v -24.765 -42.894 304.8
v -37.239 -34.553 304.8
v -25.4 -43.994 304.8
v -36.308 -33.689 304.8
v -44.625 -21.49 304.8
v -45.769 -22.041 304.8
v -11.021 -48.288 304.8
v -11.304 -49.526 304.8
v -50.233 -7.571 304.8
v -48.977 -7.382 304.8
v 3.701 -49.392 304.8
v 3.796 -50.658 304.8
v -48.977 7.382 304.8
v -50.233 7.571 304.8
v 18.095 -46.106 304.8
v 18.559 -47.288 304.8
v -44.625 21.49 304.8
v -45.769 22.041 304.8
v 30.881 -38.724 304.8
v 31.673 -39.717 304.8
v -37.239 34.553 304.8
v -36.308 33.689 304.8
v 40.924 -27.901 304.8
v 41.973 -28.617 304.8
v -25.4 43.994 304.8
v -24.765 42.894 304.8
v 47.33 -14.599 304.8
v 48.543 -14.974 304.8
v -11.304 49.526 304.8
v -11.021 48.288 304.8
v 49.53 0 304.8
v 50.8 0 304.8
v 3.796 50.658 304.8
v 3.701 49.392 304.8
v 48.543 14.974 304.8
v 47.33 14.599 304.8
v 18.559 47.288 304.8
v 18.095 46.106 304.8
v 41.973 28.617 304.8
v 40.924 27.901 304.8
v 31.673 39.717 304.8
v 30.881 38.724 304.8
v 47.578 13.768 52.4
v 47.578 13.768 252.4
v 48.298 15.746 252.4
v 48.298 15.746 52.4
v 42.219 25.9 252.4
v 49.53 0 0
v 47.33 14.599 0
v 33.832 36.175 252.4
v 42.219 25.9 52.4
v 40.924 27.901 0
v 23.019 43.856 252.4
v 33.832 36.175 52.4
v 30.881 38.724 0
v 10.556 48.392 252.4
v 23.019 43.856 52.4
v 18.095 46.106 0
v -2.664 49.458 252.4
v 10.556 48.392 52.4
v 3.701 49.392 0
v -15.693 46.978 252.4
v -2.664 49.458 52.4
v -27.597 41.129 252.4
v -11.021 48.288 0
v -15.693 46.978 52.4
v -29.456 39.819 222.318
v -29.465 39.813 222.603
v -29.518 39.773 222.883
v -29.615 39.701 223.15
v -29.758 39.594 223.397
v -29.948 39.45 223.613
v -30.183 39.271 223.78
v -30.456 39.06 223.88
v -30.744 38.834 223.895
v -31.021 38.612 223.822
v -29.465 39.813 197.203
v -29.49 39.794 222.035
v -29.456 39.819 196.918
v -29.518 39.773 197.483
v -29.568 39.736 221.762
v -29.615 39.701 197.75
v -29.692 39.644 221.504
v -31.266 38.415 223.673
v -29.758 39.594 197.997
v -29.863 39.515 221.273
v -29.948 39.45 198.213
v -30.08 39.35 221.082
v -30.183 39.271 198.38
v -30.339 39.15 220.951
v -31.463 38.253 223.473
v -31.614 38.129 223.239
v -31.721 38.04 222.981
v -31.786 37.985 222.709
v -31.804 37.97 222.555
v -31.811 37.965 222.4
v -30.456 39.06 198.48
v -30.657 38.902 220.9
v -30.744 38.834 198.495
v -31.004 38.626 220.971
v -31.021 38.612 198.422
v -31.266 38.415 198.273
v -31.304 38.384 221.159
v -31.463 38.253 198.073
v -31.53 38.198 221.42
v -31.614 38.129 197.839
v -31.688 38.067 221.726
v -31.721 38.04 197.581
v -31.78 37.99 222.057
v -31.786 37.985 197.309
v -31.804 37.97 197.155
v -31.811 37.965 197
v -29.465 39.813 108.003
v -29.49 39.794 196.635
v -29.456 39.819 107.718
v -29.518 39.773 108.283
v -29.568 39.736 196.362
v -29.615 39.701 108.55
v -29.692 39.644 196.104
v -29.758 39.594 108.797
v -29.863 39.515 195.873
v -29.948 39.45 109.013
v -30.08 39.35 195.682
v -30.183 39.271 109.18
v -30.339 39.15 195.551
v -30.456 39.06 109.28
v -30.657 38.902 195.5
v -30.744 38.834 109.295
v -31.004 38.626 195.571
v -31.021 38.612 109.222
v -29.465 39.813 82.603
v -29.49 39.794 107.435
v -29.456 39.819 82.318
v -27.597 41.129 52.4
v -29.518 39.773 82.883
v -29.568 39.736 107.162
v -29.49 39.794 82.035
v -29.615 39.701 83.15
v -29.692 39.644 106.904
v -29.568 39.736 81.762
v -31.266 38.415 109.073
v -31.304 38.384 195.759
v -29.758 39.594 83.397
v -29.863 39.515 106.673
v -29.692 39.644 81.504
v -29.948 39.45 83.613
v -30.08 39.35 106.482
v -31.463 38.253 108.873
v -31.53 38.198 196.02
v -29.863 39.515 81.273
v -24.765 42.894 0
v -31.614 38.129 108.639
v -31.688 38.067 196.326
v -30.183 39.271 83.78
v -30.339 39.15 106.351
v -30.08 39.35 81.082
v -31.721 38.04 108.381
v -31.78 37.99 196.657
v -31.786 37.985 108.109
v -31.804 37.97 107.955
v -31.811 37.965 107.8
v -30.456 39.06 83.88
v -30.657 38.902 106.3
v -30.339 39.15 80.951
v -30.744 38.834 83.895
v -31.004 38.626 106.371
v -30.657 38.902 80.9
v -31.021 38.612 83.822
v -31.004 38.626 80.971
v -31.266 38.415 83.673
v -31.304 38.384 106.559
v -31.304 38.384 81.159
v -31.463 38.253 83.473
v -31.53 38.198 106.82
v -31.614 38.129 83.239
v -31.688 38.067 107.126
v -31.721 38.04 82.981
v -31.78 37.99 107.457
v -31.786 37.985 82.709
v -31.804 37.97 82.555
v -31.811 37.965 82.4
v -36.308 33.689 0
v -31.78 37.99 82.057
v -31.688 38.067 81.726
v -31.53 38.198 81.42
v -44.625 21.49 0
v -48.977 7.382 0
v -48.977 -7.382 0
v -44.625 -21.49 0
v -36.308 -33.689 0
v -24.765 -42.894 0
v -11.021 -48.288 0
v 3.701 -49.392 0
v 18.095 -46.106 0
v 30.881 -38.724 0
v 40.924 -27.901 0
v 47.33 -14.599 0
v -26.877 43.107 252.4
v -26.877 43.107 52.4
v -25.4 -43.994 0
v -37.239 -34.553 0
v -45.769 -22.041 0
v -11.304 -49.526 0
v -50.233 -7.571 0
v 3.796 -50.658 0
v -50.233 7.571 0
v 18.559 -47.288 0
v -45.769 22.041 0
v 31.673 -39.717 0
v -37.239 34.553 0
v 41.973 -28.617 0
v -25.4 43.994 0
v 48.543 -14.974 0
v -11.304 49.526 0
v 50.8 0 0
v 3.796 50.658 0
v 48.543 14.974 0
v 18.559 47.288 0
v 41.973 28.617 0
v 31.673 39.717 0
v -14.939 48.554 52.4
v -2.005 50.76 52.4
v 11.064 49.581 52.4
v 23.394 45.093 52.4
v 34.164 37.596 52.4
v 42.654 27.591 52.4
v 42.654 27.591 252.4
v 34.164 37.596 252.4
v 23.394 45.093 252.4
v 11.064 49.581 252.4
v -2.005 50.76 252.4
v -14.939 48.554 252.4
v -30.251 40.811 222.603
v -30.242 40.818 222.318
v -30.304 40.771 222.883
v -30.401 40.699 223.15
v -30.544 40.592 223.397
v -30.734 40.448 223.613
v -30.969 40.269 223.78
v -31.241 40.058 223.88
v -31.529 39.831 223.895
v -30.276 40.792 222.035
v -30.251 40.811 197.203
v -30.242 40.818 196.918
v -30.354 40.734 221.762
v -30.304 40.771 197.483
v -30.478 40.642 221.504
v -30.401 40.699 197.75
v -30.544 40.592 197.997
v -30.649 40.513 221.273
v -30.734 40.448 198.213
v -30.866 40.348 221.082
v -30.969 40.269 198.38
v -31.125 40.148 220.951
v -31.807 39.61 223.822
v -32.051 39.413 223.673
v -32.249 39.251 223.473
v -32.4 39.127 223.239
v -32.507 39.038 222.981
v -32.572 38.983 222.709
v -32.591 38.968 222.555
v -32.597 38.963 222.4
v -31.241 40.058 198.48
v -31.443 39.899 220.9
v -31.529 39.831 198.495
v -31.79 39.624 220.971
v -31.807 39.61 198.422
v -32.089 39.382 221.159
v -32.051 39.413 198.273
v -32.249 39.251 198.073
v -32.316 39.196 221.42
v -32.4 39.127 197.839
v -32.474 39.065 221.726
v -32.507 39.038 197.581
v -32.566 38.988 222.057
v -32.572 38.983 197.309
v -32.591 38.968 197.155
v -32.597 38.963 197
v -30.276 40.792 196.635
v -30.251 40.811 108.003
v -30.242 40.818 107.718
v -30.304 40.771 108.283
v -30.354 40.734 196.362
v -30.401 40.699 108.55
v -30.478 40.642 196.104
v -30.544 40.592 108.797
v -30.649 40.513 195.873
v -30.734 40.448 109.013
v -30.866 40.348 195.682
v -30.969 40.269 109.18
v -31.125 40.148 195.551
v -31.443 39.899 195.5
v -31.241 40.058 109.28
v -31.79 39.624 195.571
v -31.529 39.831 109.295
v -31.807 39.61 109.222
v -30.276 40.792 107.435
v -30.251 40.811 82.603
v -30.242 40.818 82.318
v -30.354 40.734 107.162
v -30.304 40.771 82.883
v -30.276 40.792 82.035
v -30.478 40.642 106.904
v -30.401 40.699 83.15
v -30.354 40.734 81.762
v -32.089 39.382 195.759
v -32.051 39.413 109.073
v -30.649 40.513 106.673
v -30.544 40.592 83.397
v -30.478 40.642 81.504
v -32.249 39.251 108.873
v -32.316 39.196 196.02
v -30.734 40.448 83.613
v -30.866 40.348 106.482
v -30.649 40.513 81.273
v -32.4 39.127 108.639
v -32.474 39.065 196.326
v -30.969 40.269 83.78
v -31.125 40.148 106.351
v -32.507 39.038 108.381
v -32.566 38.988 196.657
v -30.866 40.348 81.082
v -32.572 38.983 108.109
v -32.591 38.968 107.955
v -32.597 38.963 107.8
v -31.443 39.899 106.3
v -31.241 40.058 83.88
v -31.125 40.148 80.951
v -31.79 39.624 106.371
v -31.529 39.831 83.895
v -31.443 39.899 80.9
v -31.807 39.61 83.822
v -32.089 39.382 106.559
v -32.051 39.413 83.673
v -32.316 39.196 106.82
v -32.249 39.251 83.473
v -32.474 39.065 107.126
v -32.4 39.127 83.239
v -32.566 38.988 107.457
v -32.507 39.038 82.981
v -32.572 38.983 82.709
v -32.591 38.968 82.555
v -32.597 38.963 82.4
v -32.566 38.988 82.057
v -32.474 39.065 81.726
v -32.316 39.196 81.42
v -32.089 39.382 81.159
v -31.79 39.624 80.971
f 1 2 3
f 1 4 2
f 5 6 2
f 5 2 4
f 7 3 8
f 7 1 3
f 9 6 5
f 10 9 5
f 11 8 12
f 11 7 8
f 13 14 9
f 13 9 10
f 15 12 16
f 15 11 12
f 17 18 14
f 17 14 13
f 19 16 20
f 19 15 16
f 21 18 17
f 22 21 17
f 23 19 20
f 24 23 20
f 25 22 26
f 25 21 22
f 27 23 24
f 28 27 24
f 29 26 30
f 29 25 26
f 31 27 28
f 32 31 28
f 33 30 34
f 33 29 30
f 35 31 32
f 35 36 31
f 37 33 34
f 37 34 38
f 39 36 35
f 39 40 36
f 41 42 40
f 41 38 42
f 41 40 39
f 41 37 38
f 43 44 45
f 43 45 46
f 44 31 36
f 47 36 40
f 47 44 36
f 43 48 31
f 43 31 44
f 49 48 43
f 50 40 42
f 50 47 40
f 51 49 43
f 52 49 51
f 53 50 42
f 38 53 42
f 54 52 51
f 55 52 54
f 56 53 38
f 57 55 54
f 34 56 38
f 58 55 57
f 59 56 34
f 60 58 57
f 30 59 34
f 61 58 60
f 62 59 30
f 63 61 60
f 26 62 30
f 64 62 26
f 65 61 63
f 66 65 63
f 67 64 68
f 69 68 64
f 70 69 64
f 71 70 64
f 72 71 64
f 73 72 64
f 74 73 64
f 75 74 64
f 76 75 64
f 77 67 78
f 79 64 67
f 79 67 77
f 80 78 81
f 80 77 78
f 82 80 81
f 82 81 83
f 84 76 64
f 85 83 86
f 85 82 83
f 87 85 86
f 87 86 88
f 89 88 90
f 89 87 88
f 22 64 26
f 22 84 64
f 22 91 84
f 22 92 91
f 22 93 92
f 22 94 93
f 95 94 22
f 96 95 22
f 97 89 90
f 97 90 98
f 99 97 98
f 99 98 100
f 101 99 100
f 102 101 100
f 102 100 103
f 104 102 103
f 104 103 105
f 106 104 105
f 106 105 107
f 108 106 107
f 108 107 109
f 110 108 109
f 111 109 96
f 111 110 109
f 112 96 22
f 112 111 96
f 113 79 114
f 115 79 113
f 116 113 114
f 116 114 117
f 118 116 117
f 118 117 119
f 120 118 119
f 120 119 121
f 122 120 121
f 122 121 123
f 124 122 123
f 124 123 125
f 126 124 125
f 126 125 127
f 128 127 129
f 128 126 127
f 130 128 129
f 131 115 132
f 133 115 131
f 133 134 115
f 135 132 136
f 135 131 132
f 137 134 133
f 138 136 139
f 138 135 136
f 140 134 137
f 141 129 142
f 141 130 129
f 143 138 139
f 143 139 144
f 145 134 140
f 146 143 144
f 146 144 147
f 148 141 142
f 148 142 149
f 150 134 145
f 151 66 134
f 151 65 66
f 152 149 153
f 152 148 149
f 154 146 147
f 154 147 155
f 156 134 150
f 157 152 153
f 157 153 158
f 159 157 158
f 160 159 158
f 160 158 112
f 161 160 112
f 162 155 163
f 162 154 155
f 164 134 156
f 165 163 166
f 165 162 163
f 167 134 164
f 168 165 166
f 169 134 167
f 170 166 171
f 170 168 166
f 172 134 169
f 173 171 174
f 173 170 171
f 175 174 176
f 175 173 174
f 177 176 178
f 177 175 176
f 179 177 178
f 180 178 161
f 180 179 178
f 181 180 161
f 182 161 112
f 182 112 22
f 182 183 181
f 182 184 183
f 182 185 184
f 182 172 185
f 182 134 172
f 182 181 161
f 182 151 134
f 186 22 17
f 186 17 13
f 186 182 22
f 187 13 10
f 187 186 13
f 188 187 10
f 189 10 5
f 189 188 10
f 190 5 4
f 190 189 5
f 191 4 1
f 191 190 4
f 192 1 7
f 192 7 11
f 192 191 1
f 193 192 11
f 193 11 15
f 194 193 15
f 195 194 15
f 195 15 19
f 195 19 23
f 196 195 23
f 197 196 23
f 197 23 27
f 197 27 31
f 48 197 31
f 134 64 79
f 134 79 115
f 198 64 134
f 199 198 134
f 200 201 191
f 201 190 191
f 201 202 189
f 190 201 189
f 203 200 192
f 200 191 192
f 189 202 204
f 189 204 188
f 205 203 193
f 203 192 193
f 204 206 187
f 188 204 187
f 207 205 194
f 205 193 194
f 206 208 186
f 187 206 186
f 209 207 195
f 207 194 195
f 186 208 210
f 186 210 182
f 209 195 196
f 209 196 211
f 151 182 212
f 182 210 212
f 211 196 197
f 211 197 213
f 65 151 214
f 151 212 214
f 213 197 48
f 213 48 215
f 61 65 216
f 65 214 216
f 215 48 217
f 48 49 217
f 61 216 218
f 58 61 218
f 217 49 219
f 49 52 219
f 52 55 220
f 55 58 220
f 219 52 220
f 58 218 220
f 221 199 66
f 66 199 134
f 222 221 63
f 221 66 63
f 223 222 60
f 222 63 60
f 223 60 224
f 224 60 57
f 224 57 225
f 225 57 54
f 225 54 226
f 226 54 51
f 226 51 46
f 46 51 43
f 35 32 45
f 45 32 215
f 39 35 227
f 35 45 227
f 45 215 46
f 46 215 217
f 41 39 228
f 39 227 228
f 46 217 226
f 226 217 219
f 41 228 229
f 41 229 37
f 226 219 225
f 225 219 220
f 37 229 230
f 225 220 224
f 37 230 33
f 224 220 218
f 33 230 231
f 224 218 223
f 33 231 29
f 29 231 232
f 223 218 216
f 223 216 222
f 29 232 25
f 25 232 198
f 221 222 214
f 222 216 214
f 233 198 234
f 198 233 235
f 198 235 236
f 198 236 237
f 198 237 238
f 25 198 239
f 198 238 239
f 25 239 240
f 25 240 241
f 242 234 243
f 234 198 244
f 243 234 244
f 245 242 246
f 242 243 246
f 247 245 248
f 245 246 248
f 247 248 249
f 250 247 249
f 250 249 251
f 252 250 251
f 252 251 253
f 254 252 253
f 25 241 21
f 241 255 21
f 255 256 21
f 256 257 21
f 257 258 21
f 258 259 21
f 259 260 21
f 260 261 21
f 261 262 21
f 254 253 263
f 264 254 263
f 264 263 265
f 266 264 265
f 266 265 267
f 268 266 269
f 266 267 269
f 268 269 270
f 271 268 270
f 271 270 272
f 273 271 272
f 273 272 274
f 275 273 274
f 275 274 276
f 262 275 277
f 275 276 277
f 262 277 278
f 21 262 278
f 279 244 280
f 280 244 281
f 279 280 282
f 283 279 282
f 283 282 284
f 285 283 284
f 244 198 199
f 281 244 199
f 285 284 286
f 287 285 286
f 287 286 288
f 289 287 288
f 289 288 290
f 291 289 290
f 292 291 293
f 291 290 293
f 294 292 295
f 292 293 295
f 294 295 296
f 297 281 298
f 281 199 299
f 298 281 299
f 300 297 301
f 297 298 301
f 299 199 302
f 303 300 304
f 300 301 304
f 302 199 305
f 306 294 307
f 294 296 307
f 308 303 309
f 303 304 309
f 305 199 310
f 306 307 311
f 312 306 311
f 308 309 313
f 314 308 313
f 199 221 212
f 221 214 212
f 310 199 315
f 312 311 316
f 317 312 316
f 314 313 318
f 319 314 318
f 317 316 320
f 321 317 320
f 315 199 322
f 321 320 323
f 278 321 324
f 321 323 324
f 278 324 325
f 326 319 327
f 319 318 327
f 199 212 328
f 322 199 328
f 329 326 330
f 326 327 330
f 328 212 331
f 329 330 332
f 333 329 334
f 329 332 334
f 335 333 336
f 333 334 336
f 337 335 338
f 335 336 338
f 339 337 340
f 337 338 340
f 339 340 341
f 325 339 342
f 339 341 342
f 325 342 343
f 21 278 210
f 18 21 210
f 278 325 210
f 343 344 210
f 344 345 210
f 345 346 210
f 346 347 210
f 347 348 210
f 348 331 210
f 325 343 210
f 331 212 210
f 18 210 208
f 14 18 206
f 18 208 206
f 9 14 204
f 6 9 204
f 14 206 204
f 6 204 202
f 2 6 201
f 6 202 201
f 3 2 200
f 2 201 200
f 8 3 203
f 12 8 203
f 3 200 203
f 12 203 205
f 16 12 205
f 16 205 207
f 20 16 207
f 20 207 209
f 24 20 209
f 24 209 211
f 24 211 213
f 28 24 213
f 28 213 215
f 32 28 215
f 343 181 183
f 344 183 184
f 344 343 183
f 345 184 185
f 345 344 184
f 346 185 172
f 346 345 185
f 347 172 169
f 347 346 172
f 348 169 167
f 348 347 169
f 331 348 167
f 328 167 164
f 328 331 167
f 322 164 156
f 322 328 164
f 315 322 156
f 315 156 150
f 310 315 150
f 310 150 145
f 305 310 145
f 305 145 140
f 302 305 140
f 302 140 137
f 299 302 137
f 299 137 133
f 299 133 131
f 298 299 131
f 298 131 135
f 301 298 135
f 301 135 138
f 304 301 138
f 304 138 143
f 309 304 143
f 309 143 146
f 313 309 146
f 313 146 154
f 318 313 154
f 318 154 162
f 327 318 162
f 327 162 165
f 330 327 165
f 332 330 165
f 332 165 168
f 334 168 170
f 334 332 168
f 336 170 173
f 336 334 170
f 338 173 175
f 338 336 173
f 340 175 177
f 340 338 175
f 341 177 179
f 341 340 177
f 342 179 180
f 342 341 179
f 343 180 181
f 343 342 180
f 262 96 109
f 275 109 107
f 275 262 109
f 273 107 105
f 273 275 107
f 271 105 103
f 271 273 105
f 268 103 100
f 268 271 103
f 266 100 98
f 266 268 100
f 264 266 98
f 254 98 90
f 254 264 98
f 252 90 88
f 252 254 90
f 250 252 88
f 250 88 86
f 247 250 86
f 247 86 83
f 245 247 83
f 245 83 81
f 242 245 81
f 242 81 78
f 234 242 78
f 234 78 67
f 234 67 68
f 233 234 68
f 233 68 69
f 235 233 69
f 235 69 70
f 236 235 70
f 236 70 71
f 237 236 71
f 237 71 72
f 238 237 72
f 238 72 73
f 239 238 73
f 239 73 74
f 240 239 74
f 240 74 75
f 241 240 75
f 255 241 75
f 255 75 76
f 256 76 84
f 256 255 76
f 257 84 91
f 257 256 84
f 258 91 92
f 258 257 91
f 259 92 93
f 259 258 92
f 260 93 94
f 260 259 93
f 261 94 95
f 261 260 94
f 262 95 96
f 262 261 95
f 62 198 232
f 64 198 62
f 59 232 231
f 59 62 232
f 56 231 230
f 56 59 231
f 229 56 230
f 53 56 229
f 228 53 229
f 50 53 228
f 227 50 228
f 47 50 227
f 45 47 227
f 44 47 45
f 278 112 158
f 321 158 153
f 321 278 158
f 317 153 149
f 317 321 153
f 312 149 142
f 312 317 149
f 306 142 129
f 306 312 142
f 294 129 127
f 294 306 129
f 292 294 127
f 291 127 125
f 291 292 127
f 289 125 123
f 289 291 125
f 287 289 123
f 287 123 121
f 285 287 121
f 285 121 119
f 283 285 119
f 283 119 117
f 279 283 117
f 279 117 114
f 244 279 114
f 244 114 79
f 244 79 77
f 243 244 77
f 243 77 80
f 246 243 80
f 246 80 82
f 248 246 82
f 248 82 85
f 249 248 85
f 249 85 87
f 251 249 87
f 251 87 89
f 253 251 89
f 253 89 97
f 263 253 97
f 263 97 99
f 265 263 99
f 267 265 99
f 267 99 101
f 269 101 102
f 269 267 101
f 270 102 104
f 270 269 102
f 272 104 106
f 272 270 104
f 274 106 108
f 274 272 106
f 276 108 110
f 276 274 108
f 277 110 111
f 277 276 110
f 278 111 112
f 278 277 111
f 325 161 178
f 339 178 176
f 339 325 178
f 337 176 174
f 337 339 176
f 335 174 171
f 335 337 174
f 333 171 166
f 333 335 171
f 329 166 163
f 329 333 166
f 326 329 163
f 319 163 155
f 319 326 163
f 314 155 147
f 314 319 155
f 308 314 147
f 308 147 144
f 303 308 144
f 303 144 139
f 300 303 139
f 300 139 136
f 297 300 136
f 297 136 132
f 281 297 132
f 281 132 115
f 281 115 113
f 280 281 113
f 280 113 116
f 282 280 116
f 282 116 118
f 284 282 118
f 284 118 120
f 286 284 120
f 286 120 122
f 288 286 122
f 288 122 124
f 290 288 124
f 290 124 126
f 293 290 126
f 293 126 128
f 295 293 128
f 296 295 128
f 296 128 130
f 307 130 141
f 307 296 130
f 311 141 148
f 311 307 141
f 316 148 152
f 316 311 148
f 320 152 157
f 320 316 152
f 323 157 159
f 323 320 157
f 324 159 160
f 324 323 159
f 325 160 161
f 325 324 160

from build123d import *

# Parameters (mm, degrees)
SKETCH2_R           = 50.8
SKETCH2_R_2         = 49.53
BOSS_EXTRUDE1_DEPTH = 304.8
CUT_EXTRUDE1_REACH  = 67.111
SKETCH3_W           = 80
SKETCH3_H           = 200
SKETCH7_R           = 1.5
CUT_EXTRUDE2_DEPTH  = 10


with BuildPart() as part:
    # Sketch2 → Boss-Extrude1 (new body)
    with BuildSketch(Plane.XY):
        Circle(SKETCH2_R)
        Circle(SKETCH2_R_2, mode=Mode.SUBTRACT)
    extrude(amount=BOSS_EXTRUDE1_DEPTH)

    # Sketch3 → Cut-Extrude1 (cut, up to next)
    with BuildSketch(Plane(origin=(0, 0, 0), x_dir=(0.939692621, -0.342020143, 0), z_dir=(0.342020143, 0.939692621, 0)), mode=Mode.PRIVATE) as cut_extrude1_sk1:
        with Locations((0, -152.4)):
            Rectangle(SKETCH3_W, SKETCH3_H)
    cut_extrude1_tool1 = extrude(cut_extrude1_sk1.sketch, amount=CUT_EXTRUDE1_REACH, mode=Mode.PRIVATE) & part.part
    add(cut_extrude1_tool1.solids().sort_by_distance((0, 0, 152.4))[0], mode=Mode.SUBTRACT)

    # Sketch7 → Cut-Extrude2 (cut)
    with BuildSketch(Plane(origin=(-78.038389788, 6.264218534, 0), x_dir=(-0.785593968, -0.618742367, 0), z_dir=(0.618742367, -0.785593968, 0))):
        with Locations((-57.430550893, -222.4)):
            Circle(SKETCH7_R)
        with Locations((-57.430550893, -197)):
            Circle(SKETCH7_R)
        with Locations((-57.430550893, -107.8)):
            Circle(SKETCH7_R)
        with Locations((-57.430550893, -82.4)):
            Circle(SKETCH7_R)
    extrude(amount=CUT_EXTRUDE2_DEPTH, mode=Mode.SUBTRACT)


solid = part.part
